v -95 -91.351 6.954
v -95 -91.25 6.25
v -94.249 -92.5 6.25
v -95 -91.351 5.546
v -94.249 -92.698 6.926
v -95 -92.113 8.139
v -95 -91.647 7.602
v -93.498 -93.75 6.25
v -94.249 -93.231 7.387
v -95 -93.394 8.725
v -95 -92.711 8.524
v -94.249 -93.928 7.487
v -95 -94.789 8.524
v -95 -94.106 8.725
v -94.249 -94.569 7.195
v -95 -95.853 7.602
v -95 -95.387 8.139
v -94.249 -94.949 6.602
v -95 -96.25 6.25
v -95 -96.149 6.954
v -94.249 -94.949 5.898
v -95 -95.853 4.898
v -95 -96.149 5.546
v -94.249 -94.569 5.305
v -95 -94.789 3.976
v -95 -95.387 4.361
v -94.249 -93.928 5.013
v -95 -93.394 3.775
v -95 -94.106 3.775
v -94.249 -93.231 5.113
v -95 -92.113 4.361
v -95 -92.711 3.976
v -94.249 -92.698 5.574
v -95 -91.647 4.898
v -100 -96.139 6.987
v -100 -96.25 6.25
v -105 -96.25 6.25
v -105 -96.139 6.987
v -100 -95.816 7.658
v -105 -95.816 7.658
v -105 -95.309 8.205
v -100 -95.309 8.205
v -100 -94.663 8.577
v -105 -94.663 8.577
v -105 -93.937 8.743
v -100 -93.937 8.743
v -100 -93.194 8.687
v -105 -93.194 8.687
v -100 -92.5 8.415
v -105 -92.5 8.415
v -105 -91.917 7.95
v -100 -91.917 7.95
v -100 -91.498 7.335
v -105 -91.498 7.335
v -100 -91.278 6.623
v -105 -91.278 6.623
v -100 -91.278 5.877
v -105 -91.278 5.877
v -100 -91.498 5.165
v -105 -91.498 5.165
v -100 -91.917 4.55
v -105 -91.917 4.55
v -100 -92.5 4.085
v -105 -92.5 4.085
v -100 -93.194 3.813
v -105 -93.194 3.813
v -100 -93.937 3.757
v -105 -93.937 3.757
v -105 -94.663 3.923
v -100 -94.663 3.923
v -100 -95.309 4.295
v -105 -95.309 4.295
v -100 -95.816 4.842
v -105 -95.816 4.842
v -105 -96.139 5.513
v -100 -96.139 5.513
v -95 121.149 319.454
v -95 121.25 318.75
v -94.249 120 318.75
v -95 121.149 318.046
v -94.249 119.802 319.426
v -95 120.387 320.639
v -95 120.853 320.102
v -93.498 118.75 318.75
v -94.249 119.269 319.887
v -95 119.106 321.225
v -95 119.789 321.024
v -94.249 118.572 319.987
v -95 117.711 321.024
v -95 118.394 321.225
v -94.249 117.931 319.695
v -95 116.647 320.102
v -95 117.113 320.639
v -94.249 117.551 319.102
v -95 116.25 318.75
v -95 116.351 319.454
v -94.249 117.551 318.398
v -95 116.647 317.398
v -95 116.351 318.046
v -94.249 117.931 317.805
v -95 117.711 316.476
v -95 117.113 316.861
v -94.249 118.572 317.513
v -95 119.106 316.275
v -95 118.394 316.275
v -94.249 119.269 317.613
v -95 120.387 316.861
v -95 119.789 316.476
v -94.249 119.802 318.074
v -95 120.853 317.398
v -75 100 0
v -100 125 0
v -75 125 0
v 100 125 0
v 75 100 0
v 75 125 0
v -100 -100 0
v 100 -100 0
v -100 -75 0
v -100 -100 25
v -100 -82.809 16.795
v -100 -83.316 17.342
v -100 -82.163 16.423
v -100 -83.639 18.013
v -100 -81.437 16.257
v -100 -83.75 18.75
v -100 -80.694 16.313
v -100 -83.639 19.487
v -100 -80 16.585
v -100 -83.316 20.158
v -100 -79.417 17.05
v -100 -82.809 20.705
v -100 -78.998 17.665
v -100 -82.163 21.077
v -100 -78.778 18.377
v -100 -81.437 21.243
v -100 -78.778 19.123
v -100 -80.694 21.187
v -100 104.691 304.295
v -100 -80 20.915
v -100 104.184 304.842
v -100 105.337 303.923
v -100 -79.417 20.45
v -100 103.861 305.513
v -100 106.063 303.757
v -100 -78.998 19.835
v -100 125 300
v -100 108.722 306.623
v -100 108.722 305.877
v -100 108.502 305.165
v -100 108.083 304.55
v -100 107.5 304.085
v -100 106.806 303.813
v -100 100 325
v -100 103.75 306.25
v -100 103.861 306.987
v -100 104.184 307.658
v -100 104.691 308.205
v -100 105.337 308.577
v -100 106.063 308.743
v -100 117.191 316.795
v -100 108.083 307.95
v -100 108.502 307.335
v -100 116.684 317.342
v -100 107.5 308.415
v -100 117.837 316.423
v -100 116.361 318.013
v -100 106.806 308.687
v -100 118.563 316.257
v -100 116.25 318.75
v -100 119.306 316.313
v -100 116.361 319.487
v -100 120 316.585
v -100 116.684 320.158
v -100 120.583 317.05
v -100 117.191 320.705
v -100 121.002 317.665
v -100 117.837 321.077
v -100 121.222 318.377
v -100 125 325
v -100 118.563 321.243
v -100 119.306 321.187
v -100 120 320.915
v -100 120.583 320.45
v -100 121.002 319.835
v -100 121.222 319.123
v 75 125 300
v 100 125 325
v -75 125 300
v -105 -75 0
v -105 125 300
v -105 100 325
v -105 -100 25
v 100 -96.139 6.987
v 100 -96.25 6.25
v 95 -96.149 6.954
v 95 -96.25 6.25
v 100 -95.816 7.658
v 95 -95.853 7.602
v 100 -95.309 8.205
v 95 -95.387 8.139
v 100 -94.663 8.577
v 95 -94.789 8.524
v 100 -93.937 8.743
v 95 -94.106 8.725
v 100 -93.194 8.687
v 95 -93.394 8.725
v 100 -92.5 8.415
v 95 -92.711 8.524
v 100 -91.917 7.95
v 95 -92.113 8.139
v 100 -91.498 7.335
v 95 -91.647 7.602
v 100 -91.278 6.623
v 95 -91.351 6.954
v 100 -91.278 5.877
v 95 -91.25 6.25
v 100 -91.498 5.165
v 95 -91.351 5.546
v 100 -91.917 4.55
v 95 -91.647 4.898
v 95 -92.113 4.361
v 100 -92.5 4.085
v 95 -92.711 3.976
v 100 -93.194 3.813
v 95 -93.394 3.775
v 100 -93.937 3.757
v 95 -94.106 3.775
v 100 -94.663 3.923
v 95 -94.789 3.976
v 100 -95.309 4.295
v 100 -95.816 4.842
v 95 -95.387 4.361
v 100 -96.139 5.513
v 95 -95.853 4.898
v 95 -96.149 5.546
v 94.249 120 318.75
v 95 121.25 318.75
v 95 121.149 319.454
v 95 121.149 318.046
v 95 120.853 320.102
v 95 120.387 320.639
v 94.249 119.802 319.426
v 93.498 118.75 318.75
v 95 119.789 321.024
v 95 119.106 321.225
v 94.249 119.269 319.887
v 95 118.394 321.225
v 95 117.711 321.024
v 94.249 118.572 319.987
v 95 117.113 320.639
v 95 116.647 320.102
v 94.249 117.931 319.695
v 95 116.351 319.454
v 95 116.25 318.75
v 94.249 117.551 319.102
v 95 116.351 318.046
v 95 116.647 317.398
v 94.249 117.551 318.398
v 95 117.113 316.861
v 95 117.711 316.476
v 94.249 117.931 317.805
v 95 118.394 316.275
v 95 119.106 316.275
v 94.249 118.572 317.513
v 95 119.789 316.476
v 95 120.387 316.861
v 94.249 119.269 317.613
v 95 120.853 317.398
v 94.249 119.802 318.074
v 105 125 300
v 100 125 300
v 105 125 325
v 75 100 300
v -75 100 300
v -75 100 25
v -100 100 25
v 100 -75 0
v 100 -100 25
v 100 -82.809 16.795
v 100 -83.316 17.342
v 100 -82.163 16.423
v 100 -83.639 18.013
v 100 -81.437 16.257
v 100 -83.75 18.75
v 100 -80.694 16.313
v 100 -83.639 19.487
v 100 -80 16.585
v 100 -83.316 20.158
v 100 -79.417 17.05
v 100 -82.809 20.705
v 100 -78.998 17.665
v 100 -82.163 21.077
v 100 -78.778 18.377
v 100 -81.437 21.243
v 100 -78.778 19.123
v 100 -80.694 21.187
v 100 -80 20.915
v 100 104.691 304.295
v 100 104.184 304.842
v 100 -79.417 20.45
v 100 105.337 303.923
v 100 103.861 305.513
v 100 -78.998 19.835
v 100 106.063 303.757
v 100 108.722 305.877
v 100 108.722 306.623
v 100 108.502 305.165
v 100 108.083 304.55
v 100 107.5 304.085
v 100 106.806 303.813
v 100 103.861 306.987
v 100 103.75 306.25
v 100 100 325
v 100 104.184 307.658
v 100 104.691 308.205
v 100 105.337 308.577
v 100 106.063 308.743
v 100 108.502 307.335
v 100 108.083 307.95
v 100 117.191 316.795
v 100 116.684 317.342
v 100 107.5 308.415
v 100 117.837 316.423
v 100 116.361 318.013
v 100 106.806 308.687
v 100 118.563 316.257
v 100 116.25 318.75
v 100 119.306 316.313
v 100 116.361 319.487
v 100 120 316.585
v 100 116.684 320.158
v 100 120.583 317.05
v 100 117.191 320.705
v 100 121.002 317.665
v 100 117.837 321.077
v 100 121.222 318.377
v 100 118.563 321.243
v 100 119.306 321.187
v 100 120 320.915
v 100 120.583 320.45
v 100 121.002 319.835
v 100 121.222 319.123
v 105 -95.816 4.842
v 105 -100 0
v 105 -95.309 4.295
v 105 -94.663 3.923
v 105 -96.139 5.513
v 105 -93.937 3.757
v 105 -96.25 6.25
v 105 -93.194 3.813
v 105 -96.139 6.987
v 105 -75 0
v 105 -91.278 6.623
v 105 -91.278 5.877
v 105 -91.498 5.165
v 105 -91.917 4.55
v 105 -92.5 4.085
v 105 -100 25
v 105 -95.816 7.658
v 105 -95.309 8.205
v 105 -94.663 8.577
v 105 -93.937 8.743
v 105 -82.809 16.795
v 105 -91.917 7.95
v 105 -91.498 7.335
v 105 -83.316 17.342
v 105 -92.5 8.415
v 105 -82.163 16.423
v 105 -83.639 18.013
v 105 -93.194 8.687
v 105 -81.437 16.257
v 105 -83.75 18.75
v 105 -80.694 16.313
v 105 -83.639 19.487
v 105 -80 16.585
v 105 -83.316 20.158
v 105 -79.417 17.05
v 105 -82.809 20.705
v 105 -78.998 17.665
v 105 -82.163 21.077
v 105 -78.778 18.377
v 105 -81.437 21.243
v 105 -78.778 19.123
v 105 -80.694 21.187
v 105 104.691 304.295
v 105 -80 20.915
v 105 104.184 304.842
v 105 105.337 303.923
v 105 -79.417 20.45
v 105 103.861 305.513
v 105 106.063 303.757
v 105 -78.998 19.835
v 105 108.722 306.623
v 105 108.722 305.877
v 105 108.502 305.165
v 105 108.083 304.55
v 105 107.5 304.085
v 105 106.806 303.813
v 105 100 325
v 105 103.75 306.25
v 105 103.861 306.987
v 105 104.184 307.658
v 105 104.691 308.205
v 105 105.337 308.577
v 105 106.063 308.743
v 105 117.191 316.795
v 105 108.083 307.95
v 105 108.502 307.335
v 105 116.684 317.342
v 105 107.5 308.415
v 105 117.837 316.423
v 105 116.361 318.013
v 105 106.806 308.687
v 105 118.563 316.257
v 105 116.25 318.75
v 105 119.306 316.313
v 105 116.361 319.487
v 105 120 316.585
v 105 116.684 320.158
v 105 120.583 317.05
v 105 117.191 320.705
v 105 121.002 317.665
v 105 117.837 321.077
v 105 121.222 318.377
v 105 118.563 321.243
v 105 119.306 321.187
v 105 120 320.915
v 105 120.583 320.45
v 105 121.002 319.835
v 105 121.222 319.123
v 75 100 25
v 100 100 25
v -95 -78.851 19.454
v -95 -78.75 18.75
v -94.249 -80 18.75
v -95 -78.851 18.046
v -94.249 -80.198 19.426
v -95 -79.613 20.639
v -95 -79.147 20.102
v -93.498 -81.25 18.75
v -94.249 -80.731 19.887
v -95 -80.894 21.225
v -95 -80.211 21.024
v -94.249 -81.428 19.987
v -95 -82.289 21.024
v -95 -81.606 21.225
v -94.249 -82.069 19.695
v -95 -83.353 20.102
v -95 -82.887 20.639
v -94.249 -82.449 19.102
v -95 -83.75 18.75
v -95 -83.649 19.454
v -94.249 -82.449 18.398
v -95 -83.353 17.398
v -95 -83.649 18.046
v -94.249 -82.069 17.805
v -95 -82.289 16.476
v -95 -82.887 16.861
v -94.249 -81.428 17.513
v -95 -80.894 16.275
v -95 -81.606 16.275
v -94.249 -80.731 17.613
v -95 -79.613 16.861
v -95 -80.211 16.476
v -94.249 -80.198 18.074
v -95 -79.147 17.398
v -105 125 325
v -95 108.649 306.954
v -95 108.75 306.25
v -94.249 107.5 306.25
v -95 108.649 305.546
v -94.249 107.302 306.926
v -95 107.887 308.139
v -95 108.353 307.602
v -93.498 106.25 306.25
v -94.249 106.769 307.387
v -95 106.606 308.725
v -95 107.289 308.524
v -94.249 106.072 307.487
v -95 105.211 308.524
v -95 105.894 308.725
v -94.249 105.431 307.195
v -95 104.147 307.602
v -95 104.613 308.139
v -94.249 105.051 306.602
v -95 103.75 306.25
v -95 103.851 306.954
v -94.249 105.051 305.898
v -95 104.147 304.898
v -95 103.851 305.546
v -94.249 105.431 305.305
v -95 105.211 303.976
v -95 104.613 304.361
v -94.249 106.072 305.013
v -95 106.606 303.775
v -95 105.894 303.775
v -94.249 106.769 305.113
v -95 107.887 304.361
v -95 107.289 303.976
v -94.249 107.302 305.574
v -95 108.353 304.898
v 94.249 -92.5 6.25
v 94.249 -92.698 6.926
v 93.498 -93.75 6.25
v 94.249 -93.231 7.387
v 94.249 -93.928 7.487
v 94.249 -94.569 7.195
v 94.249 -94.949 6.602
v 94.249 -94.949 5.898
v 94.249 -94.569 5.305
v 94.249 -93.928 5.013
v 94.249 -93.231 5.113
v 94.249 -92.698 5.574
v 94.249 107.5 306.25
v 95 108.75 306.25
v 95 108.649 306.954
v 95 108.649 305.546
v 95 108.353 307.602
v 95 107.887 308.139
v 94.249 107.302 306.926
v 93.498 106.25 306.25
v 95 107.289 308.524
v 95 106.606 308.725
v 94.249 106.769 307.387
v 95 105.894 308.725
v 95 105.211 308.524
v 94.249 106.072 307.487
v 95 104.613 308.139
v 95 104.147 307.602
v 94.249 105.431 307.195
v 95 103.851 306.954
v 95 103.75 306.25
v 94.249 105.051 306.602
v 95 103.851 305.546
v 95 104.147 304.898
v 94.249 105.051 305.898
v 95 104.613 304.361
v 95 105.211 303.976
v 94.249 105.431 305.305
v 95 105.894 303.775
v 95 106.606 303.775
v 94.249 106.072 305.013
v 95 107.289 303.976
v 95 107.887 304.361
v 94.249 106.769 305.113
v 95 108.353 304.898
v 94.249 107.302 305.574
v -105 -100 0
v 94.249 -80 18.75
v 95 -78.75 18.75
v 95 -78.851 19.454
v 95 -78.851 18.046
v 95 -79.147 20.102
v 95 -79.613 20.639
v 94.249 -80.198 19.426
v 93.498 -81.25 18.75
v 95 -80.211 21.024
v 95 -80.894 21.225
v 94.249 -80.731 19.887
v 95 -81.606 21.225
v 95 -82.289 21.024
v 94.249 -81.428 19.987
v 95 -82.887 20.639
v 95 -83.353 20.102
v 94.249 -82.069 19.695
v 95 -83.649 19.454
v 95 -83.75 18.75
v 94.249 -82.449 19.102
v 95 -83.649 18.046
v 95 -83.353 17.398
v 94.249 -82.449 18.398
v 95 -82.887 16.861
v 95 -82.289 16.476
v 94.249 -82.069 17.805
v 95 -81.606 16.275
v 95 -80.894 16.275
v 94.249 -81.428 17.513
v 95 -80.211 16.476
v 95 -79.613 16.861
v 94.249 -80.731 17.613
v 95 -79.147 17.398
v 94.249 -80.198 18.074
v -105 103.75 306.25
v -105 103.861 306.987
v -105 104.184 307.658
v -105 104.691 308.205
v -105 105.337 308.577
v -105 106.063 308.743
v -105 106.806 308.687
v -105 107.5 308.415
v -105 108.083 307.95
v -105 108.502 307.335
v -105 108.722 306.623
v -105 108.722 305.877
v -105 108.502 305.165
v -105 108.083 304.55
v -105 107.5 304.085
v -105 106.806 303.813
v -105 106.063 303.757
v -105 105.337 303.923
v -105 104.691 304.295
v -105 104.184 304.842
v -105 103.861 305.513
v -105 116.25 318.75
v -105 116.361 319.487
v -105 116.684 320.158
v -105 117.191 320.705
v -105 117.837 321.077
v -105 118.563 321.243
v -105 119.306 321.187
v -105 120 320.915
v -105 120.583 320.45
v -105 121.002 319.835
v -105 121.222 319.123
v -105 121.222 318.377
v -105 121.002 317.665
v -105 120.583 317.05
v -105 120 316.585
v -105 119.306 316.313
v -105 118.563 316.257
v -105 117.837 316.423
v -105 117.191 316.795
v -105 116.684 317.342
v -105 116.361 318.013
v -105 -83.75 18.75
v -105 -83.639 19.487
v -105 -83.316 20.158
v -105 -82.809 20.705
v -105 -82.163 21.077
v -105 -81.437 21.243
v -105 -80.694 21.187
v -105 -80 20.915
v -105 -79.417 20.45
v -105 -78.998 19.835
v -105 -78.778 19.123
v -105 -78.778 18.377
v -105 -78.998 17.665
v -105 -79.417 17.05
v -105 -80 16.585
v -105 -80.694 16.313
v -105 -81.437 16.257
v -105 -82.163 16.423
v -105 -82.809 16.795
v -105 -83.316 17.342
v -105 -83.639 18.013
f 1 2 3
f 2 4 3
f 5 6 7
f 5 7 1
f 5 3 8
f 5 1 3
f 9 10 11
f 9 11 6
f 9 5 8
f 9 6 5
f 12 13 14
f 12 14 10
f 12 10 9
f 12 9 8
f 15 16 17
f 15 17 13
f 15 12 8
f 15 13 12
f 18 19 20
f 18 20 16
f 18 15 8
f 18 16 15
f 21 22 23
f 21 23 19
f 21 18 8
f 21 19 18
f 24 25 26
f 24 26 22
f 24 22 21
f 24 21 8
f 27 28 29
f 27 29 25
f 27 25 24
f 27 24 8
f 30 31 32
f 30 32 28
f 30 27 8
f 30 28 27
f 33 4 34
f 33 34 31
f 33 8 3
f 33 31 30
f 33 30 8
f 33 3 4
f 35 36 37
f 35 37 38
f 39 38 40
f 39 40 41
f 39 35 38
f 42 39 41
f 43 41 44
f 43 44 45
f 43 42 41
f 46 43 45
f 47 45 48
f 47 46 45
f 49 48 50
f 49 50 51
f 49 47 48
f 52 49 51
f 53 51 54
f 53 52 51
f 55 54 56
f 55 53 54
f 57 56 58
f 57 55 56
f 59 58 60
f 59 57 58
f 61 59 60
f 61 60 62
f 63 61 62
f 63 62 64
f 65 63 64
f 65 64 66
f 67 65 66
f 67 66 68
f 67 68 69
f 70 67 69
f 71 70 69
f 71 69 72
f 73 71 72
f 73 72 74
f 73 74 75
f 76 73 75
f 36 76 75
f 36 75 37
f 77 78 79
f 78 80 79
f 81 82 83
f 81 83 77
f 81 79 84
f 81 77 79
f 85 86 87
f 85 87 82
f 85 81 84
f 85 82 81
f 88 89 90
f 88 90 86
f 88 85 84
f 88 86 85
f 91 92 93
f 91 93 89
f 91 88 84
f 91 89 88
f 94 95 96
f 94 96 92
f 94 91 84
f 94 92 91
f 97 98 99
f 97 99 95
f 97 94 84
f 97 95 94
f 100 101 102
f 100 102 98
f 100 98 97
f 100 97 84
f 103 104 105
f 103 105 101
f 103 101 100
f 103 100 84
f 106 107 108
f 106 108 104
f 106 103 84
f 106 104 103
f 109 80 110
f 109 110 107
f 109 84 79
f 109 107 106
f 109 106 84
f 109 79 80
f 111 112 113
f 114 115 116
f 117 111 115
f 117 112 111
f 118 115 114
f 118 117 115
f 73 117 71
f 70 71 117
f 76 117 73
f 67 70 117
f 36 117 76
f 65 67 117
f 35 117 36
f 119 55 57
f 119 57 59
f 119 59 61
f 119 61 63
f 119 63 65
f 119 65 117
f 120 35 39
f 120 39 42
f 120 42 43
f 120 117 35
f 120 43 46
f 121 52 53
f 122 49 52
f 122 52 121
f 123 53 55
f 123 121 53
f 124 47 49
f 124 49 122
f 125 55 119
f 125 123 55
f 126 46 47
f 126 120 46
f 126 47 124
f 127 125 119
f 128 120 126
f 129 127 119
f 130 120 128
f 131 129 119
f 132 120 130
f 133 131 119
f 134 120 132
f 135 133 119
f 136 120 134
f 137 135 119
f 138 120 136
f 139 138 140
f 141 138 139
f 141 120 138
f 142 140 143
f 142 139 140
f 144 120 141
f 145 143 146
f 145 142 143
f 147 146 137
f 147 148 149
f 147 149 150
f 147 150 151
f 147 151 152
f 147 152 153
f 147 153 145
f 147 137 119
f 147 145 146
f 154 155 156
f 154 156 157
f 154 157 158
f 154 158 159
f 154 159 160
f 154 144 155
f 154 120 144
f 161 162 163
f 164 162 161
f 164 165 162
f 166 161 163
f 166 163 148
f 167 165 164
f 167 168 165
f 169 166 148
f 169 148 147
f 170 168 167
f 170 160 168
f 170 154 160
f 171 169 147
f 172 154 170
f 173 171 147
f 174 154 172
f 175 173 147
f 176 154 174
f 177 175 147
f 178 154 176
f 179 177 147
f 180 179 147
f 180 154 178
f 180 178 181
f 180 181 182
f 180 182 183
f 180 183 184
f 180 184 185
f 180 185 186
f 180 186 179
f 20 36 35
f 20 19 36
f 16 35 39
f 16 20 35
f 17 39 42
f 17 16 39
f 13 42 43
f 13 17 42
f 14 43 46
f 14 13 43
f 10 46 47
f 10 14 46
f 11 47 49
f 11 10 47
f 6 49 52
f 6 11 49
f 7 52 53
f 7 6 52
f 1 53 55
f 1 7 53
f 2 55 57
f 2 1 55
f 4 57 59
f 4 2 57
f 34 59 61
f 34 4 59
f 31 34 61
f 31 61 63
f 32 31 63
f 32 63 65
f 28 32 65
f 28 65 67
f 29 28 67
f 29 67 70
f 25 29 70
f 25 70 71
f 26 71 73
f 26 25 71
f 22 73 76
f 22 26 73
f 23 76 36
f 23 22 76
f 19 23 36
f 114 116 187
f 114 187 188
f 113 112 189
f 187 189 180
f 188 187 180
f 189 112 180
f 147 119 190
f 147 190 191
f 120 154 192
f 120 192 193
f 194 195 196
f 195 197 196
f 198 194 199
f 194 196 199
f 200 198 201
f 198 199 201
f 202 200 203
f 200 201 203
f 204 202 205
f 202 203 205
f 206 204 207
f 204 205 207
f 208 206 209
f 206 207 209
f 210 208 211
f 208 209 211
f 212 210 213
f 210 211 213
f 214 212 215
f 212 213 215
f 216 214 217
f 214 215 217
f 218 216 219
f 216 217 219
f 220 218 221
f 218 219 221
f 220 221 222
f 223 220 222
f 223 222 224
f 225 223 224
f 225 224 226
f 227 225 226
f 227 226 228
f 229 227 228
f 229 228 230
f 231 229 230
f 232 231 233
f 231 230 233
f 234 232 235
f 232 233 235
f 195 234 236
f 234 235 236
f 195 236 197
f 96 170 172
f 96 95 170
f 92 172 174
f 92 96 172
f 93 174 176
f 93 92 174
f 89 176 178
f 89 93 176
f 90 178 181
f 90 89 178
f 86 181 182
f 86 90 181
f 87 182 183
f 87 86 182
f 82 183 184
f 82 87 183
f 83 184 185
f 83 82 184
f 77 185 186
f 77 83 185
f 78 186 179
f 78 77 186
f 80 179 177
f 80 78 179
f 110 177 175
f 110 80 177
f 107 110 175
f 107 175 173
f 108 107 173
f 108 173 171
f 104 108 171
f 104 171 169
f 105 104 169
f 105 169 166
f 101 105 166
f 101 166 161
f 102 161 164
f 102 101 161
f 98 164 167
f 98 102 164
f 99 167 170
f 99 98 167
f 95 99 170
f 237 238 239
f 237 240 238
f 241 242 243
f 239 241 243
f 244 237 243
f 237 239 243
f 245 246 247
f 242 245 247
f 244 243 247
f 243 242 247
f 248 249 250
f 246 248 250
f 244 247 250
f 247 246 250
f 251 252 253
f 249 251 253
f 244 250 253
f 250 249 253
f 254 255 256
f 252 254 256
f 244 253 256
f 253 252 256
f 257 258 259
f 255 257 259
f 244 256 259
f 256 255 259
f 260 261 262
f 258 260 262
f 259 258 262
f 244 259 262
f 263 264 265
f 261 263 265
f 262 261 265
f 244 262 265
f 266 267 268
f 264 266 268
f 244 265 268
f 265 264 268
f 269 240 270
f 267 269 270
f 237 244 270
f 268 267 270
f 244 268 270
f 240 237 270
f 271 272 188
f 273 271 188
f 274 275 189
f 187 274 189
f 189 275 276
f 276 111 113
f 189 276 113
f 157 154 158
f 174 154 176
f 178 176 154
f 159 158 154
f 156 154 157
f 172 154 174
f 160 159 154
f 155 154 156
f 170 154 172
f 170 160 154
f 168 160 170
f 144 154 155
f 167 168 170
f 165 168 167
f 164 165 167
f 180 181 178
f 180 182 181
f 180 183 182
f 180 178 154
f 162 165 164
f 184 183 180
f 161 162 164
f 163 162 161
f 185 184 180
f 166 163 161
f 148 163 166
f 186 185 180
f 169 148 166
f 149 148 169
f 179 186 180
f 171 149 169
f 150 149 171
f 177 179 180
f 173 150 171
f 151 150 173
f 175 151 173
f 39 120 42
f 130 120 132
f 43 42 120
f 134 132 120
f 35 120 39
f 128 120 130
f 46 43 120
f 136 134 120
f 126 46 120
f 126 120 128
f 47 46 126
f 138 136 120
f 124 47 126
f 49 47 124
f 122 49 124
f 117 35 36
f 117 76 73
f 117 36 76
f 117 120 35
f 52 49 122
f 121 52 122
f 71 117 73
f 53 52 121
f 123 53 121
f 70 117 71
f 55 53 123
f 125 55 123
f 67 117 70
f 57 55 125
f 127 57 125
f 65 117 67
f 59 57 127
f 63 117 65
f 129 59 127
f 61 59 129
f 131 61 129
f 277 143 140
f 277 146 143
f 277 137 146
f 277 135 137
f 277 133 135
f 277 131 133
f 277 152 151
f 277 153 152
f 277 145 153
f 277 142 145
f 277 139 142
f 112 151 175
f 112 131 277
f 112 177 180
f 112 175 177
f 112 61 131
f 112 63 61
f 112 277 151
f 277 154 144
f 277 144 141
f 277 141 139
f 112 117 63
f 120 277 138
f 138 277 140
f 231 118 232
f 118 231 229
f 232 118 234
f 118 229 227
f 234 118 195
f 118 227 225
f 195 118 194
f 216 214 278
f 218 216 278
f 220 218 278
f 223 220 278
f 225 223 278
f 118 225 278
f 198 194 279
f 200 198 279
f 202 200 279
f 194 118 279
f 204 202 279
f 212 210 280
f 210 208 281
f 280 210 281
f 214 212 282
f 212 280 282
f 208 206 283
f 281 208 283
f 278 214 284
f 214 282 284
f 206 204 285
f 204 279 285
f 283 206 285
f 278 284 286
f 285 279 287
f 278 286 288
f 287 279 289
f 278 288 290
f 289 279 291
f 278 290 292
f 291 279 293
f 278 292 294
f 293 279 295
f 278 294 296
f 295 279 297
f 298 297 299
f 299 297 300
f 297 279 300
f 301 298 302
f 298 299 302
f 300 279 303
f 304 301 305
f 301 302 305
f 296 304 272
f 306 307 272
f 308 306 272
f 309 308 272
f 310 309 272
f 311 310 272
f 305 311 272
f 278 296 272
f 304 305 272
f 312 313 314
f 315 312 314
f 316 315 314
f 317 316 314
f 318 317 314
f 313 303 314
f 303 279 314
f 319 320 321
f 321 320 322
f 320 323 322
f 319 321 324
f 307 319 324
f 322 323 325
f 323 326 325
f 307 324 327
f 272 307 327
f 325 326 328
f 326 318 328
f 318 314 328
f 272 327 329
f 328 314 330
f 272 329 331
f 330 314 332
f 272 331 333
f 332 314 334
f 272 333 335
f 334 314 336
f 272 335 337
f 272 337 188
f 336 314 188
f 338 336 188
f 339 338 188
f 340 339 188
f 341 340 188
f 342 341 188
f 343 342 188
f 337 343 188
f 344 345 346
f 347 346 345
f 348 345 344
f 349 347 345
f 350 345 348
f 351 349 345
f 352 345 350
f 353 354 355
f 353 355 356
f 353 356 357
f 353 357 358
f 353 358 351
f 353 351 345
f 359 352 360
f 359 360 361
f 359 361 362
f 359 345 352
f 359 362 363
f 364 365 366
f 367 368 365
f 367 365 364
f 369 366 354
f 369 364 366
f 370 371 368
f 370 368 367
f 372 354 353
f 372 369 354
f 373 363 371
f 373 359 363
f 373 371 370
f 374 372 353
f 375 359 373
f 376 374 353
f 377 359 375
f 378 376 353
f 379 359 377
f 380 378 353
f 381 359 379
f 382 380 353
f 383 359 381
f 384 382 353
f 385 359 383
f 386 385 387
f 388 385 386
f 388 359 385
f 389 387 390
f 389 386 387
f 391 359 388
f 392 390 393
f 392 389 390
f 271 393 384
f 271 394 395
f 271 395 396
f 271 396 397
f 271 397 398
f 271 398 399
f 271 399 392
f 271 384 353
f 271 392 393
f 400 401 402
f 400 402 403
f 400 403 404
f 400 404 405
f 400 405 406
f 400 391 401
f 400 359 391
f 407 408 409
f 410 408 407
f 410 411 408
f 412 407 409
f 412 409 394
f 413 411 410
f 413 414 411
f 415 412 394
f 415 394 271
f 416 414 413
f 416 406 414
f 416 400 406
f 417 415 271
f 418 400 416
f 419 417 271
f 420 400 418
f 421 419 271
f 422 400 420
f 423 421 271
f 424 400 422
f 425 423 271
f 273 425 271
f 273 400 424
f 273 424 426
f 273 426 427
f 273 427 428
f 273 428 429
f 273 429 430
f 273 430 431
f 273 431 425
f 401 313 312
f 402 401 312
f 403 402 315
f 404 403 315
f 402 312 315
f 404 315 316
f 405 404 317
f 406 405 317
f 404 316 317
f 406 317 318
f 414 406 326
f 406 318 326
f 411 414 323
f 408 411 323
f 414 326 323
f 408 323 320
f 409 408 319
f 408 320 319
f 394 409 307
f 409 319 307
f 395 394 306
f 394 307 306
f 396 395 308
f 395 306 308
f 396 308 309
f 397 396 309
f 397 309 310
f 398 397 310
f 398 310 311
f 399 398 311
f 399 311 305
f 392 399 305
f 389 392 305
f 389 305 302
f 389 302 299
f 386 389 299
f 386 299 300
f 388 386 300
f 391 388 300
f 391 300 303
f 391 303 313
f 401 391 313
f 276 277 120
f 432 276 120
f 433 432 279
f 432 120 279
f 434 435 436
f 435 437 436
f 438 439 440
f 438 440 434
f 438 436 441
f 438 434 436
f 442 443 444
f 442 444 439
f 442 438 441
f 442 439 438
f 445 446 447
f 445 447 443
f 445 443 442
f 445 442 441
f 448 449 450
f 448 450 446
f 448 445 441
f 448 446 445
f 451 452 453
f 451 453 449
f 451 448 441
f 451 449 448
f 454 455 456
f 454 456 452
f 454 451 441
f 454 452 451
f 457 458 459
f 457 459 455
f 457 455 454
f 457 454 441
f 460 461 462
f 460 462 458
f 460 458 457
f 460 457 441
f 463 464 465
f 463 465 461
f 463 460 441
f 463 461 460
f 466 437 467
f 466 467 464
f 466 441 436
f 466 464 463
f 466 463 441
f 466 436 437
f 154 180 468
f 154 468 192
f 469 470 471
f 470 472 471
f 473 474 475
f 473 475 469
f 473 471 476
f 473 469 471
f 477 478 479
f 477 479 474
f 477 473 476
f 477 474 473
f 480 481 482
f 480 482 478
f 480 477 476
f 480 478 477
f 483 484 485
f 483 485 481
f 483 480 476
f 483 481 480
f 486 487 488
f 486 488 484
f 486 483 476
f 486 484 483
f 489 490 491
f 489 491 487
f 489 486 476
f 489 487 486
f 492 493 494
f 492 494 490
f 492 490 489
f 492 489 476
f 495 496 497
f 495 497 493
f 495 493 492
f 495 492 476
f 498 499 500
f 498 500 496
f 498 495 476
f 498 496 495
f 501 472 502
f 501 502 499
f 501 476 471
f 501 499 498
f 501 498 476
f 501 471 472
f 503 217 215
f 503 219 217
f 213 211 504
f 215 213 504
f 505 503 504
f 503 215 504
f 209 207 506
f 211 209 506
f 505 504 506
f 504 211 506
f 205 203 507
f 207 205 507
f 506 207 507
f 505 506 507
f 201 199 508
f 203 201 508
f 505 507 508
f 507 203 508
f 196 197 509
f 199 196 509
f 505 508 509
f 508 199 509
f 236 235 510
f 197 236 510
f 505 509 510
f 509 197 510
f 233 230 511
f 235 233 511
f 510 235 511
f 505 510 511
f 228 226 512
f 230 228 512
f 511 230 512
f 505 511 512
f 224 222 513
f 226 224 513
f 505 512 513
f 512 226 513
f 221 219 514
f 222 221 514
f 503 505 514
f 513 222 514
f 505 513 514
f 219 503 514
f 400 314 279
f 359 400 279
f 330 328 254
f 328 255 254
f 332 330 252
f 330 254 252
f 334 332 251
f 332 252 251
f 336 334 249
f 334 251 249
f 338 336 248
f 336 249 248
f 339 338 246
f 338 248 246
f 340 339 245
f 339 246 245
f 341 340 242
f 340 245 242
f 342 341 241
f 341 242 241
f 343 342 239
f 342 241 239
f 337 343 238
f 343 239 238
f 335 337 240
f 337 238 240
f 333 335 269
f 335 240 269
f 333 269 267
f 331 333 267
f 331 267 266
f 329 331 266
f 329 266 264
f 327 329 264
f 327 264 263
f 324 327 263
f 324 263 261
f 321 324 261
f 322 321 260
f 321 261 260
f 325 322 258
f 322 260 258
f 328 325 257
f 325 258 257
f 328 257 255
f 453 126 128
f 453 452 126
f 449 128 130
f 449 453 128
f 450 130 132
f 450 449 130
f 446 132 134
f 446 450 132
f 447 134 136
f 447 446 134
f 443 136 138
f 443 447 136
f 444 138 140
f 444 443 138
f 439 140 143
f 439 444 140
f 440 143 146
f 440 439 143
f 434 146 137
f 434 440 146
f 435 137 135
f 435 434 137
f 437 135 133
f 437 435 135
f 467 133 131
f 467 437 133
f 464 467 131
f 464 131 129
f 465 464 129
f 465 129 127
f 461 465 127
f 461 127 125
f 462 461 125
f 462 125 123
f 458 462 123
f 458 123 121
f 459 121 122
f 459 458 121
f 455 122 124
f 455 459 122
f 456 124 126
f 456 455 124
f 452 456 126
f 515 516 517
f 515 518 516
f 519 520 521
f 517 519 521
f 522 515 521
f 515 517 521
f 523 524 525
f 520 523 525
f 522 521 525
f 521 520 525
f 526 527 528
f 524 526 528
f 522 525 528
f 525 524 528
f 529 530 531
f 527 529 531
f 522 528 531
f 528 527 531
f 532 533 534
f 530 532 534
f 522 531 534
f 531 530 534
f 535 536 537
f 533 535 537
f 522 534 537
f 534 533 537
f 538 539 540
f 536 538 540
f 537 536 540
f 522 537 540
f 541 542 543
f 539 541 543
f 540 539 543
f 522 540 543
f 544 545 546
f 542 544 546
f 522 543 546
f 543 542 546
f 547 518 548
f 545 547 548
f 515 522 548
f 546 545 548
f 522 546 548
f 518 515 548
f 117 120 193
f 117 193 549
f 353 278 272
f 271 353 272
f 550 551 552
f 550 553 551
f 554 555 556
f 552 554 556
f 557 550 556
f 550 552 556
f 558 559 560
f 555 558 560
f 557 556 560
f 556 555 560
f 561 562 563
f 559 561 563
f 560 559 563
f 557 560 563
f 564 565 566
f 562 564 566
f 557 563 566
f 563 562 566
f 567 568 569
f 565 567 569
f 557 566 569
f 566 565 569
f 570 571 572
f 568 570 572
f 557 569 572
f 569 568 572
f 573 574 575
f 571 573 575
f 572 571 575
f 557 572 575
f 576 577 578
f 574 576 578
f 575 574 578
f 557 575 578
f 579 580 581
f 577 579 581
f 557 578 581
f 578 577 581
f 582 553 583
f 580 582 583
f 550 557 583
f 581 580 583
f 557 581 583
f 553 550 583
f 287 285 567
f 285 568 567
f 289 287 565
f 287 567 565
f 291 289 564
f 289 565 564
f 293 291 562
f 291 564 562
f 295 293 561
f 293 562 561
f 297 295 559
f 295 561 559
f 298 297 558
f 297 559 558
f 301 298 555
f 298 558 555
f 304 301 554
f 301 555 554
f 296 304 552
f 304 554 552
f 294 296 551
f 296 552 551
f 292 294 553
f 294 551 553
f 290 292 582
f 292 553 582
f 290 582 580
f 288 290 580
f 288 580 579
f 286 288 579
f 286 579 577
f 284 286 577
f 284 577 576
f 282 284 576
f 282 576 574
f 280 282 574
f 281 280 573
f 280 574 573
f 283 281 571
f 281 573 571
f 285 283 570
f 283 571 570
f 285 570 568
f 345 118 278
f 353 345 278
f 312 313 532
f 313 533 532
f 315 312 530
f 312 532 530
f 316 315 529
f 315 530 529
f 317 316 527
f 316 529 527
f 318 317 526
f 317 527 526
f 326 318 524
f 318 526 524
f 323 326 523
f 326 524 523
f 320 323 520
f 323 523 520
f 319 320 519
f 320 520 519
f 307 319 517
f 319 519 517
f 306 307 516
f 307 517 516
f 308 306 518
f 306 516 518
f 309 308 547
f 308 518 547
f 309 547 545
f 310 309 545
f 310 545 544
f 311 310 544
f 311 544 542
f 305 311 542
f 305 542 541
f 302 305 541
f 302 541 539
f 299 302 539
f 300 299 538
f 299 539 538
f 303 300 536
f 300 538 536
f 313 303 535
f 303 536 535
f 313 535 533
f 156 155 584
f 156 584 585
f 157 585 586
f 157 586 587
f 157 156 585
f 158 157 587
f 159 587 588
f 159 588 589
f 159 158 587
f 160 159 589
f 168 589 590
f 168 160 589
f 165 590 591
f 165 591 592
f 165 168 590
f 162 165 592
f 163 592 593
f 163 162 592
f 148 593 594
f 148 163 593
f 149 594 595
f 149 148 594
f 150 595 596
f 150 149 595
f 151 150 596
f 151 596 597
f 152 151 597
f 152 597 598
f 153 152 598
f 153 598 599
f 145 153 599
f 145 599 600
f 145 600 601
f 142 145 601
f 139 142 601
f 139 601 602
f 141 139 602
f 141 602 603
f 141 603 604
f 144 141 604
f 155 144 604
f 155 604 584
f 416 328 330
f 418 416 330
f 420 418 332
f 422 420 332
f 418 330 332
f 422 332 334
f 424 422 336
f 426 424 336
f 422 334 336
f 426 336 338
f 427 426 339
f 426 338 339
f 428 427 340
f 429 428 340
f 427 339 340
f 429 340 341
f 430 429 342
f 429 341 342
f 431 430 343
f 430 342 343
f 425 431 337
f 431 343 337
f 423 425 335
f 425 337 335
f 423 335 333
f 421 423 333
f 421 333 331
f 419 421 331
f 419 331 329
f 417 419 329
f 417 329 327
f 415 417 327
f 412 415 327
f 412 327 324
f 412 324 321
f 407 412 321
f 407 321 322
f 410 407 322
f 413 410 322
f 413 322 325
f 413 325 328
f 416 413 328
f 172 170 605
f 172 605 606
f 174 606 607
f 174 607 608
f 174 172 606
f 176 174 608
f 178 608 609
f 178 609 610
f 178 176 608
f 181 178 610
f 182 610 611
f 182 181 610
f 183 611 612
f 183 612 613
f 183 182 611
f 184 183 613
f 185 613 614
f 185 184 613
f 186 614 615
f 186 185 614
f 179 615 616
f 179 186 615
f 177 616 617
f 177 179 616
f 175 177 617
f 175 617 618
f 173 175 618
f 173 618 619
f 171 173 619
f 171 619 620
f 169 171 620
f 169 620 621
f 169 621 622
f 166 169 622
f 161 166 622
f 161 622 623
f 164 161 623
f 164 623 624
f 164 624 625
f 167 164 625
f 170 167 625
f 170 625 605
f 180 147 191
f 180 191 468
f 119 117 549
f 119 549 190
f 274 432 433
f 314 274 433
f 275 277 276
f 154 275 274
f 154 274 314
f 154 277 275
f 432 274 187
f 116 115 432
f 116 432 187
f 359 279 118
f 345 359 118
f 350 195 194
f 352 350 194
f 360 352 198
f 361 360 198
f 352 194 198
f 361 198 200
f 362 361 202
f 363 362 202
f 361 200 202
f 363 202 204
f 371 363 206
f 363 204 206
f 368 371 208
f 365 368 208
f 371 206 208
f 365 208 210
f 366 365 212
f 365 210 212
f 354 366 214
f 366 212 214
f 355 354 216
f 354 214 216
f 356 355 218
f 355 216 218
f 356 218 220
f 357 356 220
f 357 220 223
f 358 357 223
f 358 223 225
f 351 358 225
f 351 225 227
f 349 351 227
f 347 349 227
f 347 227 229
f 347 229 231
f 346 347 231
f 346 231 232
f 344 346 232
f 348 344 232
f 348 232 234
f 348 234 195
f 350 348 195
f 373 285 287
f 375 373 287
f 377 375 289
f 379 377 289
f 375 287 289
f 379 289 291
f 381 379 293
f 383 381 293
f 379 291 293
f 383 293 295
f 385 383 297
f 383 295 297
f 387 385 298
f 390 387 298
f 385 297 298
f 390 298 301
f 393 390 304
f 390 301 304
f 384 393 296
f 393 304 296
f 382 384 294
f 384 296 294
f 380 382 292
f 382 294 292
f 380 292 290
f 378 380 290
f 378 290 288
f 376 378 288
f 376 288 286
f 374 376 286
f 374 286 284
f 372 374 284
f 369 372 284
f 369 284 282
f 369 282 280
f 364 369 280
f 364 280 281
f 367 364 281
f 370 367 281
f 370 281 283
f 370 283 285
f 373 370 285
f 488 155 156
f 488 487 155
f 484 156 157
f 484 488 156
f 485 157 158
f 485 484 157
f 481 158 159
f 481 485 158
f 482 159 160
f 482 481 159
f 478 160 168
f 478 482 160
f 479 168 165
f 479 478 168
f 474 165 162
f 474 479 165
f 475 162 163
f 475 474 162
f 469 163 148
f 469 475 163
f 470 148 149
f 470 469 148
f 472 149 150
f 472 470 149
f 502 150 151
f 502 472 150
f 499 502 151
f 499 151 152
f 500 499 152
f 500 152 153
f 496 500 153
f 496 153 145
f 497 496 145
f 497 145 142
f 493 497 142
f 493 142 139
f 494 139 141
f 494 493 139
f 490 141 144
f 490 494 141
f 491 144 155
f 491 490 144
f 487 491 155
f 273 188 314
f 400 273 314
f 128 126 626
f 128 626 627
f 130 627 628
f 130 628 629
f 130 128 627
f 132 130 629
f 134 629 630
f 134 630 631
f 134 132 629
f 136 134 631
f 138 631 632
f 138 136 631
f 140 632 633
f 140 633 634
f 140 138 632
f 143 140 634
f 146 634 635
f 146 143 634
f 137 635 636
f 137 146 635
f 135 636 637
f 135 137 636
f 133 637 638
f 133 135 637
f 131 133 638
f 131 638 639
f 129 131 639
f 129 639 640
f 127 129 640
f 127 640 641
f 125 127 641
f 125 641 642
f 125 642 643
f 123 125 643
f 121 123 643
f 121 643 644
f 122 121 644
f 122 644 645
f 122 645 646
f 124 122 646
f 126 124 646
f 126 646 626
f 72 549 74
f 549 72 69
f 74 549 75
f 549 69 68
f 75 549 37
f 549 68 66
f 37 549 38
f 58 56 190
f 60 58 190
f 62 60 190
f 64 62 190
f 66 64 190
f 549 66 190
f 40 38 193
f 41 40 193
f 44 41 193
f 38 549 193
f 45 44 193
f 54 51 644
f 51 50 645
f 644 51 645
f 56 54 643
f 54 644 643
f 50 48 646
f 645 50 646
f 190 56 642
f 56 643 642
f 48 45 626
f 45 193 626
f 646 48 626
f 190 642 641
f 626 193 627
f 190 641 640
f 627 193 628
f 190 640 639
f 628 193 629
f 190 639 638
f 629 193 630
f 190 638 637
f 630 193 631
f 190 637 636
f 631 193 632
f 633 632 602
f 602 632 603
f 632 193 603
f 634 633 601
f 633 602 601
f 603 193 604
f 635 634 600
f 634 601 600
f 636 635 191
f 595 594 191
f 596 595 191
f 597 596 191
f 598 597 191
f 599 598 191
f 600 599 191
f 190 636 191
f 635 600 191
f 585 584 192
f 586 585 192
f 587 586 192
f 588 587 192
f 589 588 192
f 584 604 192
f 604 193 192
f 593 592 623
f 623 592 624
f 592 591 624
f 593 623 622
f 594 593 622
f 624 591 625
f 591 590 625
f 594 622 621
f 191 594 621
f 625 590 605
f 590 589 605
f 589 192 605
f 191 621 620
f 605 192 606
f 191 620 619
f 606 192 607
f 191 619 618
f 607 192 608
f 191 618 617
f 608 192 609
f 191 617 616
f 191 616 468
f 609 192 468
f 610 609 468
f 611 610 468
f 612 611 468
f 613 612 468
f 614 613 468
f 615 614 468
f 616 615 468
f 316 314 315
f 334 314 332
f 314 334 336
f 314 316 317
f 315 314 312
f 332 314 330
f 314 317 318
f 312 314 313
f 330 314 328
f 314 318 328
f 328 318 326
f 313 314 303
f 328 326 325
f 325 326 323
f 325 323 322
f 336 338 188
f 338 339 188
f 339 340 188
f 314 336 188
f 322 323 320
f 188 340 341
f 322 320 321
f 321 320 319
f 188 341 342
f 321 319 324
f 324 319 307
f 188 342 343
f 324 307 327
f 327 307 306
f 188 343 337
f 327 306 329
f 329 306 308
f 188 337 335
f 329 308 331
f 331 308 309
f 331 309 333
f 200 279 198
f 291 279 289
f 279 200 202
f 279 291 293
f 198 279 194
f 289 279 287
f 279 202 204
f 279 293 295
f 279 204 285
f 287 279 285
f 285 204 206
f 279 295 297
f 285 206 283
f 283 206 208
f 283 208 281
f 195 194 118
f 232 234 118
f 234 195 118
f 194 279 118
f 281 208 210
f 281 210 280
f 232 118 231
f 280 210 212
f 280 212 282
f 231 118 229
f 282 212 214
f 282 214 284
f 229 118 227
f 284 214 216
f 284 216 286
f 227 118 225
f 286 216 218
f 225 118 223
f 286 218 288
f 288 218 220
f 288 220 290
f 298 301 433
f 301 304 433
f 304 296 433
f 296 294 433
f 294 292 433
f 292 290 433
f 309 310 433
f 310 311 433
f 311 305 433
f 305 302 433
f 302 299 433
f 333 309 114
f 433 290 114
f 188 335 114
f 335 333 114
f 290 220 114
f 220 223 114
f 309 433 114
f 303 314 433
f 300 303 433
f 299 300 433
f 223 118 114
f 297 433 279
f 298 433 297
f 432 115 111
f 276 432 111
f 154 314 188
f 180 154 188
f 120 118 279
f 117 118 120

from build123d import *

# Parameters (mm, degrees)
F0_W       = 200
F0_H       = 200
F1_DEPTH   = 25
F2_W       = 25
F2_H       = 25
F3_DEPTH   = 25
F4_W       = 25
F4_H       = 25
F5_DEPTH   = 300
F7_DEPTH   = 5
F9_D       = 5
F9_DEPTH   = 10
F9_TIP     = 1.5021515476
F9_2_D     = 5
F9_2_DEPTH = 10
F9_2_TIP   = 1.5021515476
F10_W      = 100
F10_H      = 267.6203101873
F11_DEPTH  = 325.001
F13_W      = 25
F13_H      = 25
F14_DEPTH  = 150


with BuildPart() as f1:
    # F0 (on Top) → F1 (new body)
    with BuildSketch(Plane.XY):
        Rectangle(F0_W, F0_H)
    extrude(amount=F1_DEPTH)

    # F2 (on face) → F3 (join)
    with BuildSketch(Plane(origin=(0, 100, 0), x_dir=(-1, 0, 0), z_dir=(0, 1, 0))):
        with Locations((-87.5, 12.5)):
            Rectangle(F2_W, F2_H)
        with Locations((87.5, 12.5)):
            Rectangle(F2_W, F2_H)
    extrude(amount=F3_DEPTH)

    # F4 (on face) → F5 (join)
    with BuildSketch(Plane.XY.offset(25)):
        with Locations((87.5, 112.5)):
            Rectangle(F4_W, F4_H)
        with Locations((-87.5, 112.5)):
            Rectangle(F4_W, F4_H)
    extrude(amount=F5_DEPTH)

    # F9
    with Locations(Plane.YZ.offset(105)):
        with Locations((-81.25, 18.75), (-93.75, 6.25), (118.75, 318.75), (106.25, 306.25)):
            Hole(F9_D / 2, depth=F9_DEPTH)
            with Locations((0, 0, -(F9_DEPTH + F9_TIP / 2))):  # 118° drill point
                Cone(0, F9_D / 2, F9_TIP, mode=Mode.SUBTRACT)

    # F10 (on face) → F11 (cut, through all)
    with BuildSketch(Plane.XY.offset(325)):
        with Locations((-50, -8.8101550937)):
            Rectangle(F10_W, F10_H)
    extrude(amount=-F11_DEPTH, mode=Mode.SUBTRACT)


with BuildPart() as f7:
    # F6 (on face) → F7 (new body)
    with BuildSketch(Plane.YZ.offset(100)):
        Polygon((125, 300), (125, 325), (100, 325), (-100, 25), (-100, 0), (-75, 0), align=None)
    extrude(amount=F7_DEPTH)

    # F9#2
    with Locations(Plane.YZ.offset(105)):
        with Locations((-81.25, 18.75), (-93.75, 6.25), (118.75, 318.75), (106.25, 306.25)):
            Hole(F9_2_D / 2, depth=F9_2_DEPTH)
            with Locations((0, 0, -(F9_2_DEPTH + F9_2_TIP / 2))):  # 118° drill point
                Cone(0, F9_2_D / 2, F9_2_TIP, mode=Mode.SUBTRACT)


with BuildPart() as f12_1:
    # F12: instance of F7
    add(f7.part.mirror(Plane(origin=(0, 0, 12.5), x_dir=(0, -1, 0), z_dir=(-1, 0, 0))))


with BuildPart() as f12_2:
    # F12: instance of F1
    add(f1.part.mirror(Plane(origin=(0, 0, 12.5), x_dir=(0, -1, 0), z_dir=(-1, 0, 0))))


with BuildPart() as f1_1:
    add(f1.part)

    add(f12_2.part)  # F14 merges F12_2
    # F13 (on face) → F14 (join, through all)
    with BuildSketch(Plane.YZ.offset(-75)):
        with Locations((112.5, 312.5)):
            Rectangle(F13_W, F13_H)
    extrude(amount=F14_DEPTH)


solid = Compound([f7.part, f12_1.part, f1_1.part])
